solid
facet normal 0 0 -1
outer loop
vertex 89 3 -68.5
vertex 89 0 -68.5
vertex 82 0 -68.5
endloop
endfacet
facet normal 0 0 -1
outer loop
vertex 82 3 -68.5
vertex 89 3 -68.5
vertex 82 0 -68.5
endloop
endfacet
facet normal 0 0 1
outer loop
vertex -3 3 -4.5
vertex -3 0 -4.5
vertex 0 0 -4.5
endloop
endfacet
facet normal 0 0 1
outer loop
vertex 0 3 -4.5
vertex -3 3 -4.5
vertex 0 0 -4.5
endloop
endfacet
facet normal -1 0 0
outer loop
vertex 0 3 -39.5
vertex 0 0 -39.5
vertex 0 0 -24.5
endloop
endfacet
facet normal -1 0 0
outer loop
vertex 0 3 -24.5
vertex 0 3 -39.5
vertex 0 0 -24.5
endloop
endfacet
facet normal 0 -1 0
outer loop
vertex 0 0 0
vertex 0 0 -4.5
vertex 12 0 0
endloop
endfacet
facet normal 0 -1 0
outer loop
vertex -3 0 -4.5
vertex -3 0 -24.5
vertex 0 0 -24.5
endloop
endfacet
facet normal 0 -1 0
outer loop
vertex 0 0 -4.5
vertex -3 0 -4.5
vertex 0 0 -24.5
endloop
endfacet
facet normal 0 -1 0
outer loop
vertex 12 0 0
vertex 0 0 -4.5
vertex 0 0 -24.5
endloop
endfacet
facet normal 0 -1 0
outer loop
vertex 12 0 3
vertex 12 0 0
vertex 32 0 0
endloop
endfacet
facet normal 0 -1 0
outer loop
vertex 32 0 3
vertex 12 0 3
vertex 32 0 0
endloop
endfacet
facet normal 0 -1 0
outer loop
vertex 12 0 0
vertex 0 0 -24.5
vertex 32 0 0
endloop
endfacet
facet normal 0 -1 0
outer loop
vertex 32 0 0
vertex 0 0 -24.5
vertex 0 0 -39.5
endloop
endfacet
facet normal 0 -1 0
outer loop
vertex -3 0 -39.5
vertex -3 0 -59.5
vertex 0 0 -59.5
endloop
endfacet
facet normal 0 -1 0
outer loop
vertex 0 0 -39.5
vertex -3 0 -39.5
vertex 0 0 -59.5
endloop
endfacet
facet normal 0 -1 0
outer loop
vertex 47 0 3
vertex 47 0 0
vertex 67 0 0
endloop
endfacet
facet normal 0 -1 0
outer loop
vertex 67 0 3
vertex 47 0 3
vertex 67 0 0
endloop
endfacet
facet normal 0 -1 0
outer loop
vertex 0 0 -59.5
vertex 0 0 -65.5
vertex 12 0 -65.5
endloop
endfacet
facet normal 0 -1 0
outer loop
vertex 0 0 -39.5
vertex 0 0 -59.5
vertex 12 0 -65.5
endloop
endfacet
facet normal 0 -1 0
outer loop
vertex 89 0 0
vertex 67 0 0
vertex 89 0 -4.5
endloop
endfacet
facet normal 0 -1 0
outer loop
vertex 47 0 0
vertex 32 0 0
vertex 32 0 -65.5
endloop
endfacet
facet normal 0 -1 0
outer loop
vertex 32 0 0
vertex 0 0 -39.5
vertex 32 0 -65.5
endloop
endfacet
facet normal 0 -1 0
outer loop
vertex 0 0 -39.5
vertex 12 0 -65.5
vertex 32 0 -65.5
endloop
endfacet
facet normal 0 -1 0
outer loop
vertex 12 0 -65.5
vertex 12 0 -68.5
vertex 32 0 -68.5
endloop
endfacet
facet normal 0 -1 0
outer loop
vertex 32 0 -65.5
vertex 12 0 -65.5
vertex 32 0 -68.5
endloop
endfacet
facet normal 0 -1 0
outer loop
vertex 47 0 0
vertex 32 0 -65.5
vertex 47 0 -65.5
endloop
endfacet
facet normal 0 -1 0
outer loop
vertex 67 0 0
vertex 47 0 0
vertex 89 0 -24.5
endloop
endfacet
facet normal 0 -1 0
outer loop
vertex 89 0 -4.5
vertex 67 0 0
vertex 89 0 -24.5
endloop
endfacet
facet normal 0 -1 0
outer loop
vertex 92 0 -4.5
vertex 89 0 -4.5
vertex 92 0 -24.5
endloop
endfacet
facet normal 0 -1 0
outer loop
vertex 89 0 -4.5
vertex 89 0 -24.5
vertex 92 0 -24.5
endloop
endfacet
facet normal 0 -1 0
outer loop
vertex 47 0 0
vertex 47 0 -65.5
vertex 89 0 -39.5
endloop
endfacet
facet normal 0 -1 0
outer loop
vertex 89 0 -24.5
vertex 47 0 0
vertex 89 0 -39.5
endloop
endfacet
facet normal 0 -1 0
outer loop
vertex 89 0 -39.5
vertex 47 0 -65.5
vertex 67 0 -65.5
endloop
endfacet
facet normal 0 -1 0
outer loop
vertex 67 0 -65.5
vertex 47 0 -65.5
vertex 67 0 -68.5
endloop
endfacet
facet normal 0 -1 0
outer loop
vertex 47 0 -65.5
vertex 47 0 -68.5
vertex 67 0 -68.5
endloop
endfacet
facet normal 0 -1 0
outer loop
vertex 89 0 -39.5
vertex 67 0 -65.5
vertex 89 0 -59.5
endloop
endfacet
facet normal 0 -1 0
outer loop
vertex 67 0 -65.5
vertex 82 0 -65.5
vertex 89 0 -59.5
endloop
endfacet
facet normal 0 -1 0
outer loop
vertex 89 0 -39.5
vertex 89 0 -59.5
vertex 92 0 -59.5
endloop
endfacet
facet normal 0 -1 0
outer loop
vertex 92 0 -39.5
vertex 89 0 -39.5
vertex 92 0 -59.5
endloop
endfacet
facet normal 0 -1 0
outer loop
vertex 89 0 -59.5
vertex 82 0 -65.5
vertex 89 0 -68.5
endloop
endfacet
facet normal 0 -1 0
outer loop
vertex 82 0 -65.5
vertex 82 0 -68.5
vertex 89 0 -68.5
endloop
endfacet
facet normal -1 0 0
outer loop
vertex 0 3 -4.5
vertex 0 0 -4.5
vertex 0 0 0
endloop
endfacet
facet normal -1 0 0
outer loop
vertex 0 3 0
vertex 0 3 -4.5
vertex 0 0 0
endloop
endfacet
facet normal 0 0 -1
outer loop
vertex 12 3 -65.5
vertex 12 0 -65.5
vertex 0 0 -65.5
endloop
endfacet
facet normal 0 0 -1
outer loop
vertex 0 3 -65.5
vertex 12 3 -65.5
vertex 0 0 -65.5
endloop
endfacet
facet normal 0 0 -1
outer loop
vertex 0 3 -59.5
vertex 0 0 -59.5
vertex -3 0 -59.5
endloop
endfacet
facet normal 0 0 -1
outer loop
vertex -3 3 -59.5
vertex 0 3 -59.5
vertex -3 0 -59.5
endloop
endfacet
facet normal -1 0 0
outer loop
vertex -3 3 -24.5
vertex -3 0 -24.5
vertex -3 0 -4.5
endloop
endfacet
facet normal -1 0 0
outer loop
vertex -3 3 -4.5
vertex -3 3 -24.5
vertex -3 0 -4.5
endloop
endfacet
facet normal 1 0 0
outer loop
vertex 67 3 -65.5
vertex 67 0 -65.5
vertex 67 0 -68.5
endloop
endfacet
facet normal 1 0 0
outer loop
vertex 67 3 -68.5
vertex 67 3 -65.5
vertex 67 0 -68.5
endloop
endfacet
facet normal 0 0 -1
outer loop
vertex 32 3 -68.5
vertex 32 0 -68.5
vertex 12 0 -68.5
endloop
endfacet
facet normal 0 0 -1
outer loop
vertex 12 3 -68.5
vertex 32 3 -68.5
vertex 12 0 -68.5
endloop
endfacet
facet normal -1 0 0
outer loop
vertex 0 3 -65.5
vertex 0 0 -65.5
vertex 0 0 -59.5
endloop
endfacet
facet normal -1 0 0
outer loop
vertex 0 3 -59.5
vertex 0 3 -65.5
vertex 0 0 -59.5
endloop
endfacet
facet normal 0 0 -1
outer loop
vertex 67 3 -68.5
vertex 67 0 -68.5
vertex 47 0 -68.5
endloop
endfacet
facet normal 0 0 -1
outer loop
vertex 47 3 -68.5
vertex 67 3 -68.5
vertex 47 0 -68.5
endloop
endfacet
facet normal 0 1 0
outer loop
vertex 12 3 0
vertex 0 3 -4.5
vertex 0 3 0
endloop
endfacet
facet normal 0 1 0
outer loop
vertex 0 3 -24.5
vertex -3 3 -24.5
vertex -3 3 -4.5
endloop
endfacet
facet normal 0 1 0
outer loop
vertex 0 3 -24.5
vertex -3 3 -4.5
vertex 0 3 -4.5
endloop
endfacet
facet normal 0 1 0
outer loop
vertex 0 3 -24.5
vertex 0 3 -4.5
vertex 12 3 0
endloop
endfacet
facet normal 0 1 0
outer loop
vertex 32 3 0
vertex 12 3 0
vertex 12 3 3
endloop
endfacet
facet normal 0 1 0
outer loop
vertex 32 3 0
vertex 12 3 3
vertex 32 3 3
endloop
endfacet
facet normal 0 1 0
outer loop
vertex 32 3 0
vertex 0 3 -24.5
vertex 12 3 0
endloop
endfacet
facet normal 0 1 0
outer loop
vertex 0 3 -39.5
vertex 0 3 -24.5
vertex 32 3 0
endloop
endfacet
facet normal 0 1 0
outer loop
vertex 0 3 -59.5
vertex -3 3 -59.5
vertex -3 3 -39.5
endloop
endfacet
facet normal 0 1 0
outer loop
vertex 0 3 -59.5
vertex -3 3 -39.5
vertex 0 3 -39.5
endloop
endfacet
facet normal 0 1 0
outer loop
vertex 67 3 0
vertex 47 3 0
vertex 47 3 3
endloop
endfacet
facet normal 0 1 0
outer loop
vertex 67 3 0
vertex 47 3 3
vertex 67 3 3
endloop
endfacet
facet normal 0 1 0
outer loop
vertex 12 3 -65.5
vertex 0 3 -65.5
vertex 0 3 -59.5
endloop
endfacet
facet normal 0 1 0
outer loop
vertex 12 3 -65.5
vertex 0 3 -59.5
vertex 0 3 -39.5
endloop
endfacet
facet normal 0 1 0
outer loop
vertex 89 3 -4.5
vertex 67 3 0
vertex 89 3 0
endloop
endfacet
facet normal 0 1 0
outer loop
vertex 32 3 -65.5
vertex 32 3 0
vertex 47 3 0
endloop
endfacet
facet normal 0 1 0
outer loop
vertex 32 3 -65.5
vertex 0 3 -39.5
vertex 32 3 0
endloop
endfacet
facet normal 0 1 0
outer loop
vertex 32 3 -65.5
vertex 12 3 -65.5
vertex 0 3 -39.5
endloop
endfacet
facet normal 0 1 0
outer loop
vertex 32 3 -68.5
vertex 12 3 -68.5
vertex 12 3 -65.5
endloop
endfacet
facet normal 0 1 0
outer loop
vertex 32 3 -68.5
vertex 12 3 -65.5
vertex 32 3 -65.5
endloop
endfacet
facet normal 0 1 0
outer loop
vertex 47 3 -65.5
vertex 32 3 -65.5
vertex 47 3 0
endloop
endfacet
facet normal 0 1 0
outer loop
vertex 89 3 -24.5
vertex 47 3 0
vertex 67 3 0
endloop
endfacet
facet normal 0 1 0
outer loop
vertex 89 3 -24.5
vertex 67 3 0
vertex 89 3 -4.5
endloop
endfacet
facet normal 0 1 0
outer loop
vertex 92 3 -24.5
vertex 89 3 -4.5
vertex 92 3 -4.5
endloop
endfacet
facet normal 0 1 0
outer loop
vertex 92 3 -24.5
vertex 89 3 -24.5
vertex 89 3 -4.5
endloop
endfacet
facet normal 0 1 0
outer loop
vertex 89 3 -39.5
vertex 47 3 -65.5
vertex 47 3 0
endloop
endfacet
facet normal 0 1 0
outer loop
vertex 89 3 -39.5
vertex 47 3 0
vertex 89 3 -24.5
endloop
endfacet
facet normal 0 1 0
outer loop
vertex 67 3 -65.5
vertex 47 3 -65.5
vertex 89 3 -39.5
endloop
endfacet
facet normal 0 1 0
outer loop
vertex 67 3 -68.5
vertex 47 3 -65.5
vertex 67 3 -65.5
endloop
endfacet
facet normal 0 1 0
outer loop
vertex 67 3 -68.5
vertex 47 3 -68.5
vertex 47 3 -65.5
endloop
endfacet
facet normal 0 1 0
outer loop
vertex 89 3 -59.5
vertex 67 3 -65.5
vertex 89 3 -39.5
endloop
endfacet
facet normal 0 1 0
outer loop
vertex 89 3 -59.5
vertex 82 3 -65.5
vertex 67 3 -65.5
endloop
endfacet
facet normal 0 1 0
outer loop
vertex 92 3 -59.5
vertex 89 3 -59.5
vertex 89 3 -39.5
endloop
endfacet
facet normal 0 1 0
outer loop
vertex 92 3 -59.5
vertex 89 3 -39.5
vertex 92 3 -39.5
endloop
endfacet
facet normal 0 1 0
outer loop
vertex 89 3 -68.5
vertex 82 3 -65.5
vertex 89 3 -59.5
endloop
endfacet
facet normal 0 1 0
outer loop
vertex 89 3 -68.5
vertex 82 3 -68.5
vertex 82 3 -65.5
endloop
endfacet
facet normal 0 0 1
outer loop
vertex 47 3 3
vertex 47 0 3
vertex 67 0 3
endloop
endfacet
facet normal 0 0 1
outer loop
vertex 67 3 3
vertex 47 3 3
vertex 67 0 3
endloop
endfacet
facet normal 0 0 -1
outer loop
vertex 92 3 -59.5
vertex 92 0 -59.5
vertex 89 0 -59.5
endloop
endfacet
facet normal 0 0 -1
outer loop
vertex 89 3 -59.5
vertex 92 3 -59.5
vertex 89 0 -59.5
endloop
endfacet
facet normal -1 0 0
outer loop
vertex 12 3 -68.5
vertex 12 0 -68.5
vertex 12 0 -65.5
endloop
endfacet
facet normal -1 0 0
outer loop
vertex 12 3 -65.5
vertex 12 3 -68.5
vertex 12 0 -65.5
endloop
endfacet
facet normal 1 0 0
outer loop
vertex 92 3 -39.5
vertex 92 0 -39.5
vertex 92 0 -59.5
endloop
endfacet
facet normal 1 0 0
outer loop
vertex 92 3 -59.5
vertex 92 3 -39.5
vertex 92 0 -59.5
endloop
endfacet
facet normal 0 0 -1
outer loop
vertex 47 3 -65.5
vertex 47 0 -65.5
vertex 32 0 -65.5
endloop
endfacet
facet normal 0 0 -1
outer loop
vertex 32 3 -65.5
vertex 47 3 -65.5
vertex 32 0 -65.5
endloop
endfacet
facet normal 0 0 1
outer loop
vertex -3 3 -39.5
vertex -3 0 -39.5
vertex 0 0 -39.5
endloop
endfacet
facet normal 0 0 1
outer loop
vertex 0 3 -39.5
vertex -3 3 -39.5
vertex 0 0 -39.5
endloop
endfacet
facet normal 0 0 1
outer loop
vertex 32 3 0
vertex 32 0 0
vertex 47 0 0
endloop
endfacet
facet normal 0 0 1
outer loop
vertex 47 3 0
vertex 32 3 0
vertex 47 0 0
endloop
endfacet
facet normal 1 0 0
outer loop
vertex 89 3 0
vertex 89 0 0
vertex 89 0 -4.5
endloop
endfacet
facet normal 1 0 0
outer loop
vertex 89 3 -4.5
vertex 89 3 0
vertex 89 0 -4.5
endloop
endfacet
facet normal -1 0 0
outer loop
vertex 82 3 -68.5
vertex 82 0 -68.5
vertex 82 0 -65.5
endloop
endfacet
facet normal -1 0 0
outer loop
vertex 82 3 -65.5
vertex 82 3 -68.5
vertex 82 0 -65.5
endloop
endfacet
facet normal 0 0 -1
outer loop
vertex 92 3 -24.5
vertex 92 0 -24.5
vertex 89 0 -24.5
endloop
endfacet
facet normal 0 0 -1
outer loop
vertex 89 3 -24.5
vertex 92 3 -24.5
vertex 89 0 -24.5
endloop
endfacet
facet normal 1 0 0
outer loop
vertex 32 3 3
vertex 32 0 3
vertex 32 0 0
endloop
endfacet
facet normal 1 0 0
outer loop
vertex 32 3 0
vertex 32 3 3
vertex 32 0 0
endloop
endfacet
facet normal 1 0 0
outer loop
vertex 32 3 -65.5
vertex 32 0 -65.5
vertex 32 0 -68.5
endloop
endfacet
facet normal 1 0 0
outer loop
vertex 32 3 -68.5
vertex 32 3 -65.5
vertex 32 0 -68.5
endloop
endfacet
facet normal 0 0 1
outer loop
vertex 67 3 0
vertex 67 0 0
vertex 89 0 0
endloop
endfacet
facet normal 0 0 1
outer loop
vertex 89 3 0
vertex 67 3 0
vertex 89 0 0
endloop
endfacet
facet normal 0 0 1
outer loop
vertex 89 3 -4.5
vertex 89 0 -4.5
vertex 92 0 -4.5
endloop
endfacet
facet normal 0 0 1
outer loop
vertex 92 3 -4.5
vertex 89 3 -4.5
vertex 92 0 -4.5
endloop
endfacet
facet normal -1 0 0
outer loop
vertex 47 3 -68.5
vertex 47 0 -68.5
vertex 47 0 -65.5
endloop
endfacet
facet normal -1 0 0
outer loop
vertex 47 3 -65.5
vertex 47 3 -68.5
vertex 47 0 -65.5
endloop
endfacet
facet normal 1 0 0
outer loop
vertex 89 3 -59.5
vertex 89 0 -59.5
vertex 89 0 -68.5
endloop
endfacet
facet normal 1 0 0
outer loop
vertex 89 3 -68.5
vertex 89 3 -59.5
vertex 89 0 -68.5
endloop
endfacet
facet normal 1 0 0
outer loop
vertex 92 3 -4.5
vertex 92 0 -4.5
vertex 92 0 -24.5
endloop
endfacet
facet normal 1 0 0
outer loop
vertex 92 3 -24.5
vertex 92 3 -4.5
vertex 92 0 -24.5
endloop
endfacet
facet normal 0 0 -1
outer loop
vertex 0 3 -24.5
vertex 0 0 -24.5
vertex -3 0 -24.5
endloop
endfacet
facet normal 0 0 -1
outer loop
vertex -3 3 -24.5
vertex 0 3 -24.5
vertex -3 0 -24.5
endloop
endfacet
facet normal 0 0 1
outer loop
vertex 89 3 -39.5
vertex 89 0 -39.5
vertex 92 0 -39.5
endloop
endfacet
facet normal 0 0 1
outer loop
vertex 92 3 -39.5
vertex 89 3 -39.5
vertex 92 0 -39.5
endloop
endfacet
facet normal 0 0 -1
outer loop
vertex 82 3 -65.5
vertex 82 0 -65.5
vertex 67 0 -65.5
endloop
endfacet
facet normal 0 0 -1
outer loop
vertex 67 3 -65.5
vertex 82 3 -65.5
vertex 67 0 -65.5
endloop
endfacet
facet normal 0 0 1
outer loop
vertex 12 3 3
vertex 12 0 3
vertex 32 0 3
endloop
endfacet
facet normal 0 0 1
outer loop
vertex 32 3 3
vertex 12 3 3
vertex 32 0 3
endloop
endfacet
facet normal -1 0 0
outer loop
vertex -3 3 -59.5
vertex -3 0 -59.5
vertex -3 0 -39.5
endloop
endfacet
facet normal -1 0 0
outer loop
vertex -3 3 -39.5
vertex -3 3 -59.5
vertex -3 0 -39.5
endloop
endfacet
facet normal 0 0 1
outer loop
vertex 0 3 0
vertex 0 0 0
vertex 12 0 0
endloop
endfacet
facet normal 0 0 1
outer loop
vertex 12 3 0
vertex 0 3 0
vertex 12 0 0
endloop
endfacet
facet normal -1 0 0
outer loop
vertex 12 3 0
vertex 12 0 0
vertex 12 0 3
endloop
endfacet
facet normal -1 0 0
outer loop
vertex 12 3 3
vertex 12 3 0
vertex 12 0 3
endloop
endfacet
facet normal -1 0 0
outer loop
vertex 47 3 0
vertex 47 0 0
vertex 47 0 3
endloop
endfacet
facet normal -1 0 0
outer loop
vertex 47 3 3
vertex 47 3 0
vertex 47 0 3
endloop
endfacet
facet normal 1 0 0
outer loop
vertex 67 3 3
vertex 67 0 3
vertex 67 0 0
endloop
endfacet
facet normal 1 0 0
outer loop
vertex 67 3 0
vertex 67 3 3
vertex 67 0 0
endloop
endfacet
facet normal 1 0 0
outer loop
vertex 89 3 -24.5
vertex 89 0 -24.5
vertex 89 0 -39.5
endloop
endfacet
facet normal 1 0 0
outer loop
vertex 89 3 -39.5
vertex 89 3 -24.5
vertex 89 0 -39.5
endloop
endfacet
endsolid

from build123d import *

# Parameters (mm, degrees)
BOSS_EXTRUDE1_DEPTH = 3


with BuildPart() as part:
    # Sketch1 → Boss-Extrude1 (new body)
    with BuildSketch(Plane(origin=(0, 0, 0), x_dir=(1, 0, 0), z_dir=(0, 1, 0))):
        Polygon((12, 65.5), (0, 65.5), (0, 59.5), (-3, 59.5), (-3, 39.5), (0, 39.5), (0, 24.5), (-3, 24.5), (-3, 4.5), (0, 4.5), (0, 0), (12, 0), (12, -3), (32, -3), (32, 0), (47, 0), (47, -3), (67, -3), (67, 0), (89, 0), (89, 4.5), (92, 4.5), (92, 24.5), (89, 24.5), (89, 39.5), (92, 39.5), (92, 59.5), (89, 59.5), (89, 65.5), (89, 68.5), (82, 68.5), (82, 65.5), (67, 65.5), (67, 68.5), (47, 68.5), (47, 65.5), (32, 65.5), (32, 68.5), (12, 68.5), align=None)
    extrude(amount=BOSS_EXTRUDE1_DEPTH)


solid = part.part
